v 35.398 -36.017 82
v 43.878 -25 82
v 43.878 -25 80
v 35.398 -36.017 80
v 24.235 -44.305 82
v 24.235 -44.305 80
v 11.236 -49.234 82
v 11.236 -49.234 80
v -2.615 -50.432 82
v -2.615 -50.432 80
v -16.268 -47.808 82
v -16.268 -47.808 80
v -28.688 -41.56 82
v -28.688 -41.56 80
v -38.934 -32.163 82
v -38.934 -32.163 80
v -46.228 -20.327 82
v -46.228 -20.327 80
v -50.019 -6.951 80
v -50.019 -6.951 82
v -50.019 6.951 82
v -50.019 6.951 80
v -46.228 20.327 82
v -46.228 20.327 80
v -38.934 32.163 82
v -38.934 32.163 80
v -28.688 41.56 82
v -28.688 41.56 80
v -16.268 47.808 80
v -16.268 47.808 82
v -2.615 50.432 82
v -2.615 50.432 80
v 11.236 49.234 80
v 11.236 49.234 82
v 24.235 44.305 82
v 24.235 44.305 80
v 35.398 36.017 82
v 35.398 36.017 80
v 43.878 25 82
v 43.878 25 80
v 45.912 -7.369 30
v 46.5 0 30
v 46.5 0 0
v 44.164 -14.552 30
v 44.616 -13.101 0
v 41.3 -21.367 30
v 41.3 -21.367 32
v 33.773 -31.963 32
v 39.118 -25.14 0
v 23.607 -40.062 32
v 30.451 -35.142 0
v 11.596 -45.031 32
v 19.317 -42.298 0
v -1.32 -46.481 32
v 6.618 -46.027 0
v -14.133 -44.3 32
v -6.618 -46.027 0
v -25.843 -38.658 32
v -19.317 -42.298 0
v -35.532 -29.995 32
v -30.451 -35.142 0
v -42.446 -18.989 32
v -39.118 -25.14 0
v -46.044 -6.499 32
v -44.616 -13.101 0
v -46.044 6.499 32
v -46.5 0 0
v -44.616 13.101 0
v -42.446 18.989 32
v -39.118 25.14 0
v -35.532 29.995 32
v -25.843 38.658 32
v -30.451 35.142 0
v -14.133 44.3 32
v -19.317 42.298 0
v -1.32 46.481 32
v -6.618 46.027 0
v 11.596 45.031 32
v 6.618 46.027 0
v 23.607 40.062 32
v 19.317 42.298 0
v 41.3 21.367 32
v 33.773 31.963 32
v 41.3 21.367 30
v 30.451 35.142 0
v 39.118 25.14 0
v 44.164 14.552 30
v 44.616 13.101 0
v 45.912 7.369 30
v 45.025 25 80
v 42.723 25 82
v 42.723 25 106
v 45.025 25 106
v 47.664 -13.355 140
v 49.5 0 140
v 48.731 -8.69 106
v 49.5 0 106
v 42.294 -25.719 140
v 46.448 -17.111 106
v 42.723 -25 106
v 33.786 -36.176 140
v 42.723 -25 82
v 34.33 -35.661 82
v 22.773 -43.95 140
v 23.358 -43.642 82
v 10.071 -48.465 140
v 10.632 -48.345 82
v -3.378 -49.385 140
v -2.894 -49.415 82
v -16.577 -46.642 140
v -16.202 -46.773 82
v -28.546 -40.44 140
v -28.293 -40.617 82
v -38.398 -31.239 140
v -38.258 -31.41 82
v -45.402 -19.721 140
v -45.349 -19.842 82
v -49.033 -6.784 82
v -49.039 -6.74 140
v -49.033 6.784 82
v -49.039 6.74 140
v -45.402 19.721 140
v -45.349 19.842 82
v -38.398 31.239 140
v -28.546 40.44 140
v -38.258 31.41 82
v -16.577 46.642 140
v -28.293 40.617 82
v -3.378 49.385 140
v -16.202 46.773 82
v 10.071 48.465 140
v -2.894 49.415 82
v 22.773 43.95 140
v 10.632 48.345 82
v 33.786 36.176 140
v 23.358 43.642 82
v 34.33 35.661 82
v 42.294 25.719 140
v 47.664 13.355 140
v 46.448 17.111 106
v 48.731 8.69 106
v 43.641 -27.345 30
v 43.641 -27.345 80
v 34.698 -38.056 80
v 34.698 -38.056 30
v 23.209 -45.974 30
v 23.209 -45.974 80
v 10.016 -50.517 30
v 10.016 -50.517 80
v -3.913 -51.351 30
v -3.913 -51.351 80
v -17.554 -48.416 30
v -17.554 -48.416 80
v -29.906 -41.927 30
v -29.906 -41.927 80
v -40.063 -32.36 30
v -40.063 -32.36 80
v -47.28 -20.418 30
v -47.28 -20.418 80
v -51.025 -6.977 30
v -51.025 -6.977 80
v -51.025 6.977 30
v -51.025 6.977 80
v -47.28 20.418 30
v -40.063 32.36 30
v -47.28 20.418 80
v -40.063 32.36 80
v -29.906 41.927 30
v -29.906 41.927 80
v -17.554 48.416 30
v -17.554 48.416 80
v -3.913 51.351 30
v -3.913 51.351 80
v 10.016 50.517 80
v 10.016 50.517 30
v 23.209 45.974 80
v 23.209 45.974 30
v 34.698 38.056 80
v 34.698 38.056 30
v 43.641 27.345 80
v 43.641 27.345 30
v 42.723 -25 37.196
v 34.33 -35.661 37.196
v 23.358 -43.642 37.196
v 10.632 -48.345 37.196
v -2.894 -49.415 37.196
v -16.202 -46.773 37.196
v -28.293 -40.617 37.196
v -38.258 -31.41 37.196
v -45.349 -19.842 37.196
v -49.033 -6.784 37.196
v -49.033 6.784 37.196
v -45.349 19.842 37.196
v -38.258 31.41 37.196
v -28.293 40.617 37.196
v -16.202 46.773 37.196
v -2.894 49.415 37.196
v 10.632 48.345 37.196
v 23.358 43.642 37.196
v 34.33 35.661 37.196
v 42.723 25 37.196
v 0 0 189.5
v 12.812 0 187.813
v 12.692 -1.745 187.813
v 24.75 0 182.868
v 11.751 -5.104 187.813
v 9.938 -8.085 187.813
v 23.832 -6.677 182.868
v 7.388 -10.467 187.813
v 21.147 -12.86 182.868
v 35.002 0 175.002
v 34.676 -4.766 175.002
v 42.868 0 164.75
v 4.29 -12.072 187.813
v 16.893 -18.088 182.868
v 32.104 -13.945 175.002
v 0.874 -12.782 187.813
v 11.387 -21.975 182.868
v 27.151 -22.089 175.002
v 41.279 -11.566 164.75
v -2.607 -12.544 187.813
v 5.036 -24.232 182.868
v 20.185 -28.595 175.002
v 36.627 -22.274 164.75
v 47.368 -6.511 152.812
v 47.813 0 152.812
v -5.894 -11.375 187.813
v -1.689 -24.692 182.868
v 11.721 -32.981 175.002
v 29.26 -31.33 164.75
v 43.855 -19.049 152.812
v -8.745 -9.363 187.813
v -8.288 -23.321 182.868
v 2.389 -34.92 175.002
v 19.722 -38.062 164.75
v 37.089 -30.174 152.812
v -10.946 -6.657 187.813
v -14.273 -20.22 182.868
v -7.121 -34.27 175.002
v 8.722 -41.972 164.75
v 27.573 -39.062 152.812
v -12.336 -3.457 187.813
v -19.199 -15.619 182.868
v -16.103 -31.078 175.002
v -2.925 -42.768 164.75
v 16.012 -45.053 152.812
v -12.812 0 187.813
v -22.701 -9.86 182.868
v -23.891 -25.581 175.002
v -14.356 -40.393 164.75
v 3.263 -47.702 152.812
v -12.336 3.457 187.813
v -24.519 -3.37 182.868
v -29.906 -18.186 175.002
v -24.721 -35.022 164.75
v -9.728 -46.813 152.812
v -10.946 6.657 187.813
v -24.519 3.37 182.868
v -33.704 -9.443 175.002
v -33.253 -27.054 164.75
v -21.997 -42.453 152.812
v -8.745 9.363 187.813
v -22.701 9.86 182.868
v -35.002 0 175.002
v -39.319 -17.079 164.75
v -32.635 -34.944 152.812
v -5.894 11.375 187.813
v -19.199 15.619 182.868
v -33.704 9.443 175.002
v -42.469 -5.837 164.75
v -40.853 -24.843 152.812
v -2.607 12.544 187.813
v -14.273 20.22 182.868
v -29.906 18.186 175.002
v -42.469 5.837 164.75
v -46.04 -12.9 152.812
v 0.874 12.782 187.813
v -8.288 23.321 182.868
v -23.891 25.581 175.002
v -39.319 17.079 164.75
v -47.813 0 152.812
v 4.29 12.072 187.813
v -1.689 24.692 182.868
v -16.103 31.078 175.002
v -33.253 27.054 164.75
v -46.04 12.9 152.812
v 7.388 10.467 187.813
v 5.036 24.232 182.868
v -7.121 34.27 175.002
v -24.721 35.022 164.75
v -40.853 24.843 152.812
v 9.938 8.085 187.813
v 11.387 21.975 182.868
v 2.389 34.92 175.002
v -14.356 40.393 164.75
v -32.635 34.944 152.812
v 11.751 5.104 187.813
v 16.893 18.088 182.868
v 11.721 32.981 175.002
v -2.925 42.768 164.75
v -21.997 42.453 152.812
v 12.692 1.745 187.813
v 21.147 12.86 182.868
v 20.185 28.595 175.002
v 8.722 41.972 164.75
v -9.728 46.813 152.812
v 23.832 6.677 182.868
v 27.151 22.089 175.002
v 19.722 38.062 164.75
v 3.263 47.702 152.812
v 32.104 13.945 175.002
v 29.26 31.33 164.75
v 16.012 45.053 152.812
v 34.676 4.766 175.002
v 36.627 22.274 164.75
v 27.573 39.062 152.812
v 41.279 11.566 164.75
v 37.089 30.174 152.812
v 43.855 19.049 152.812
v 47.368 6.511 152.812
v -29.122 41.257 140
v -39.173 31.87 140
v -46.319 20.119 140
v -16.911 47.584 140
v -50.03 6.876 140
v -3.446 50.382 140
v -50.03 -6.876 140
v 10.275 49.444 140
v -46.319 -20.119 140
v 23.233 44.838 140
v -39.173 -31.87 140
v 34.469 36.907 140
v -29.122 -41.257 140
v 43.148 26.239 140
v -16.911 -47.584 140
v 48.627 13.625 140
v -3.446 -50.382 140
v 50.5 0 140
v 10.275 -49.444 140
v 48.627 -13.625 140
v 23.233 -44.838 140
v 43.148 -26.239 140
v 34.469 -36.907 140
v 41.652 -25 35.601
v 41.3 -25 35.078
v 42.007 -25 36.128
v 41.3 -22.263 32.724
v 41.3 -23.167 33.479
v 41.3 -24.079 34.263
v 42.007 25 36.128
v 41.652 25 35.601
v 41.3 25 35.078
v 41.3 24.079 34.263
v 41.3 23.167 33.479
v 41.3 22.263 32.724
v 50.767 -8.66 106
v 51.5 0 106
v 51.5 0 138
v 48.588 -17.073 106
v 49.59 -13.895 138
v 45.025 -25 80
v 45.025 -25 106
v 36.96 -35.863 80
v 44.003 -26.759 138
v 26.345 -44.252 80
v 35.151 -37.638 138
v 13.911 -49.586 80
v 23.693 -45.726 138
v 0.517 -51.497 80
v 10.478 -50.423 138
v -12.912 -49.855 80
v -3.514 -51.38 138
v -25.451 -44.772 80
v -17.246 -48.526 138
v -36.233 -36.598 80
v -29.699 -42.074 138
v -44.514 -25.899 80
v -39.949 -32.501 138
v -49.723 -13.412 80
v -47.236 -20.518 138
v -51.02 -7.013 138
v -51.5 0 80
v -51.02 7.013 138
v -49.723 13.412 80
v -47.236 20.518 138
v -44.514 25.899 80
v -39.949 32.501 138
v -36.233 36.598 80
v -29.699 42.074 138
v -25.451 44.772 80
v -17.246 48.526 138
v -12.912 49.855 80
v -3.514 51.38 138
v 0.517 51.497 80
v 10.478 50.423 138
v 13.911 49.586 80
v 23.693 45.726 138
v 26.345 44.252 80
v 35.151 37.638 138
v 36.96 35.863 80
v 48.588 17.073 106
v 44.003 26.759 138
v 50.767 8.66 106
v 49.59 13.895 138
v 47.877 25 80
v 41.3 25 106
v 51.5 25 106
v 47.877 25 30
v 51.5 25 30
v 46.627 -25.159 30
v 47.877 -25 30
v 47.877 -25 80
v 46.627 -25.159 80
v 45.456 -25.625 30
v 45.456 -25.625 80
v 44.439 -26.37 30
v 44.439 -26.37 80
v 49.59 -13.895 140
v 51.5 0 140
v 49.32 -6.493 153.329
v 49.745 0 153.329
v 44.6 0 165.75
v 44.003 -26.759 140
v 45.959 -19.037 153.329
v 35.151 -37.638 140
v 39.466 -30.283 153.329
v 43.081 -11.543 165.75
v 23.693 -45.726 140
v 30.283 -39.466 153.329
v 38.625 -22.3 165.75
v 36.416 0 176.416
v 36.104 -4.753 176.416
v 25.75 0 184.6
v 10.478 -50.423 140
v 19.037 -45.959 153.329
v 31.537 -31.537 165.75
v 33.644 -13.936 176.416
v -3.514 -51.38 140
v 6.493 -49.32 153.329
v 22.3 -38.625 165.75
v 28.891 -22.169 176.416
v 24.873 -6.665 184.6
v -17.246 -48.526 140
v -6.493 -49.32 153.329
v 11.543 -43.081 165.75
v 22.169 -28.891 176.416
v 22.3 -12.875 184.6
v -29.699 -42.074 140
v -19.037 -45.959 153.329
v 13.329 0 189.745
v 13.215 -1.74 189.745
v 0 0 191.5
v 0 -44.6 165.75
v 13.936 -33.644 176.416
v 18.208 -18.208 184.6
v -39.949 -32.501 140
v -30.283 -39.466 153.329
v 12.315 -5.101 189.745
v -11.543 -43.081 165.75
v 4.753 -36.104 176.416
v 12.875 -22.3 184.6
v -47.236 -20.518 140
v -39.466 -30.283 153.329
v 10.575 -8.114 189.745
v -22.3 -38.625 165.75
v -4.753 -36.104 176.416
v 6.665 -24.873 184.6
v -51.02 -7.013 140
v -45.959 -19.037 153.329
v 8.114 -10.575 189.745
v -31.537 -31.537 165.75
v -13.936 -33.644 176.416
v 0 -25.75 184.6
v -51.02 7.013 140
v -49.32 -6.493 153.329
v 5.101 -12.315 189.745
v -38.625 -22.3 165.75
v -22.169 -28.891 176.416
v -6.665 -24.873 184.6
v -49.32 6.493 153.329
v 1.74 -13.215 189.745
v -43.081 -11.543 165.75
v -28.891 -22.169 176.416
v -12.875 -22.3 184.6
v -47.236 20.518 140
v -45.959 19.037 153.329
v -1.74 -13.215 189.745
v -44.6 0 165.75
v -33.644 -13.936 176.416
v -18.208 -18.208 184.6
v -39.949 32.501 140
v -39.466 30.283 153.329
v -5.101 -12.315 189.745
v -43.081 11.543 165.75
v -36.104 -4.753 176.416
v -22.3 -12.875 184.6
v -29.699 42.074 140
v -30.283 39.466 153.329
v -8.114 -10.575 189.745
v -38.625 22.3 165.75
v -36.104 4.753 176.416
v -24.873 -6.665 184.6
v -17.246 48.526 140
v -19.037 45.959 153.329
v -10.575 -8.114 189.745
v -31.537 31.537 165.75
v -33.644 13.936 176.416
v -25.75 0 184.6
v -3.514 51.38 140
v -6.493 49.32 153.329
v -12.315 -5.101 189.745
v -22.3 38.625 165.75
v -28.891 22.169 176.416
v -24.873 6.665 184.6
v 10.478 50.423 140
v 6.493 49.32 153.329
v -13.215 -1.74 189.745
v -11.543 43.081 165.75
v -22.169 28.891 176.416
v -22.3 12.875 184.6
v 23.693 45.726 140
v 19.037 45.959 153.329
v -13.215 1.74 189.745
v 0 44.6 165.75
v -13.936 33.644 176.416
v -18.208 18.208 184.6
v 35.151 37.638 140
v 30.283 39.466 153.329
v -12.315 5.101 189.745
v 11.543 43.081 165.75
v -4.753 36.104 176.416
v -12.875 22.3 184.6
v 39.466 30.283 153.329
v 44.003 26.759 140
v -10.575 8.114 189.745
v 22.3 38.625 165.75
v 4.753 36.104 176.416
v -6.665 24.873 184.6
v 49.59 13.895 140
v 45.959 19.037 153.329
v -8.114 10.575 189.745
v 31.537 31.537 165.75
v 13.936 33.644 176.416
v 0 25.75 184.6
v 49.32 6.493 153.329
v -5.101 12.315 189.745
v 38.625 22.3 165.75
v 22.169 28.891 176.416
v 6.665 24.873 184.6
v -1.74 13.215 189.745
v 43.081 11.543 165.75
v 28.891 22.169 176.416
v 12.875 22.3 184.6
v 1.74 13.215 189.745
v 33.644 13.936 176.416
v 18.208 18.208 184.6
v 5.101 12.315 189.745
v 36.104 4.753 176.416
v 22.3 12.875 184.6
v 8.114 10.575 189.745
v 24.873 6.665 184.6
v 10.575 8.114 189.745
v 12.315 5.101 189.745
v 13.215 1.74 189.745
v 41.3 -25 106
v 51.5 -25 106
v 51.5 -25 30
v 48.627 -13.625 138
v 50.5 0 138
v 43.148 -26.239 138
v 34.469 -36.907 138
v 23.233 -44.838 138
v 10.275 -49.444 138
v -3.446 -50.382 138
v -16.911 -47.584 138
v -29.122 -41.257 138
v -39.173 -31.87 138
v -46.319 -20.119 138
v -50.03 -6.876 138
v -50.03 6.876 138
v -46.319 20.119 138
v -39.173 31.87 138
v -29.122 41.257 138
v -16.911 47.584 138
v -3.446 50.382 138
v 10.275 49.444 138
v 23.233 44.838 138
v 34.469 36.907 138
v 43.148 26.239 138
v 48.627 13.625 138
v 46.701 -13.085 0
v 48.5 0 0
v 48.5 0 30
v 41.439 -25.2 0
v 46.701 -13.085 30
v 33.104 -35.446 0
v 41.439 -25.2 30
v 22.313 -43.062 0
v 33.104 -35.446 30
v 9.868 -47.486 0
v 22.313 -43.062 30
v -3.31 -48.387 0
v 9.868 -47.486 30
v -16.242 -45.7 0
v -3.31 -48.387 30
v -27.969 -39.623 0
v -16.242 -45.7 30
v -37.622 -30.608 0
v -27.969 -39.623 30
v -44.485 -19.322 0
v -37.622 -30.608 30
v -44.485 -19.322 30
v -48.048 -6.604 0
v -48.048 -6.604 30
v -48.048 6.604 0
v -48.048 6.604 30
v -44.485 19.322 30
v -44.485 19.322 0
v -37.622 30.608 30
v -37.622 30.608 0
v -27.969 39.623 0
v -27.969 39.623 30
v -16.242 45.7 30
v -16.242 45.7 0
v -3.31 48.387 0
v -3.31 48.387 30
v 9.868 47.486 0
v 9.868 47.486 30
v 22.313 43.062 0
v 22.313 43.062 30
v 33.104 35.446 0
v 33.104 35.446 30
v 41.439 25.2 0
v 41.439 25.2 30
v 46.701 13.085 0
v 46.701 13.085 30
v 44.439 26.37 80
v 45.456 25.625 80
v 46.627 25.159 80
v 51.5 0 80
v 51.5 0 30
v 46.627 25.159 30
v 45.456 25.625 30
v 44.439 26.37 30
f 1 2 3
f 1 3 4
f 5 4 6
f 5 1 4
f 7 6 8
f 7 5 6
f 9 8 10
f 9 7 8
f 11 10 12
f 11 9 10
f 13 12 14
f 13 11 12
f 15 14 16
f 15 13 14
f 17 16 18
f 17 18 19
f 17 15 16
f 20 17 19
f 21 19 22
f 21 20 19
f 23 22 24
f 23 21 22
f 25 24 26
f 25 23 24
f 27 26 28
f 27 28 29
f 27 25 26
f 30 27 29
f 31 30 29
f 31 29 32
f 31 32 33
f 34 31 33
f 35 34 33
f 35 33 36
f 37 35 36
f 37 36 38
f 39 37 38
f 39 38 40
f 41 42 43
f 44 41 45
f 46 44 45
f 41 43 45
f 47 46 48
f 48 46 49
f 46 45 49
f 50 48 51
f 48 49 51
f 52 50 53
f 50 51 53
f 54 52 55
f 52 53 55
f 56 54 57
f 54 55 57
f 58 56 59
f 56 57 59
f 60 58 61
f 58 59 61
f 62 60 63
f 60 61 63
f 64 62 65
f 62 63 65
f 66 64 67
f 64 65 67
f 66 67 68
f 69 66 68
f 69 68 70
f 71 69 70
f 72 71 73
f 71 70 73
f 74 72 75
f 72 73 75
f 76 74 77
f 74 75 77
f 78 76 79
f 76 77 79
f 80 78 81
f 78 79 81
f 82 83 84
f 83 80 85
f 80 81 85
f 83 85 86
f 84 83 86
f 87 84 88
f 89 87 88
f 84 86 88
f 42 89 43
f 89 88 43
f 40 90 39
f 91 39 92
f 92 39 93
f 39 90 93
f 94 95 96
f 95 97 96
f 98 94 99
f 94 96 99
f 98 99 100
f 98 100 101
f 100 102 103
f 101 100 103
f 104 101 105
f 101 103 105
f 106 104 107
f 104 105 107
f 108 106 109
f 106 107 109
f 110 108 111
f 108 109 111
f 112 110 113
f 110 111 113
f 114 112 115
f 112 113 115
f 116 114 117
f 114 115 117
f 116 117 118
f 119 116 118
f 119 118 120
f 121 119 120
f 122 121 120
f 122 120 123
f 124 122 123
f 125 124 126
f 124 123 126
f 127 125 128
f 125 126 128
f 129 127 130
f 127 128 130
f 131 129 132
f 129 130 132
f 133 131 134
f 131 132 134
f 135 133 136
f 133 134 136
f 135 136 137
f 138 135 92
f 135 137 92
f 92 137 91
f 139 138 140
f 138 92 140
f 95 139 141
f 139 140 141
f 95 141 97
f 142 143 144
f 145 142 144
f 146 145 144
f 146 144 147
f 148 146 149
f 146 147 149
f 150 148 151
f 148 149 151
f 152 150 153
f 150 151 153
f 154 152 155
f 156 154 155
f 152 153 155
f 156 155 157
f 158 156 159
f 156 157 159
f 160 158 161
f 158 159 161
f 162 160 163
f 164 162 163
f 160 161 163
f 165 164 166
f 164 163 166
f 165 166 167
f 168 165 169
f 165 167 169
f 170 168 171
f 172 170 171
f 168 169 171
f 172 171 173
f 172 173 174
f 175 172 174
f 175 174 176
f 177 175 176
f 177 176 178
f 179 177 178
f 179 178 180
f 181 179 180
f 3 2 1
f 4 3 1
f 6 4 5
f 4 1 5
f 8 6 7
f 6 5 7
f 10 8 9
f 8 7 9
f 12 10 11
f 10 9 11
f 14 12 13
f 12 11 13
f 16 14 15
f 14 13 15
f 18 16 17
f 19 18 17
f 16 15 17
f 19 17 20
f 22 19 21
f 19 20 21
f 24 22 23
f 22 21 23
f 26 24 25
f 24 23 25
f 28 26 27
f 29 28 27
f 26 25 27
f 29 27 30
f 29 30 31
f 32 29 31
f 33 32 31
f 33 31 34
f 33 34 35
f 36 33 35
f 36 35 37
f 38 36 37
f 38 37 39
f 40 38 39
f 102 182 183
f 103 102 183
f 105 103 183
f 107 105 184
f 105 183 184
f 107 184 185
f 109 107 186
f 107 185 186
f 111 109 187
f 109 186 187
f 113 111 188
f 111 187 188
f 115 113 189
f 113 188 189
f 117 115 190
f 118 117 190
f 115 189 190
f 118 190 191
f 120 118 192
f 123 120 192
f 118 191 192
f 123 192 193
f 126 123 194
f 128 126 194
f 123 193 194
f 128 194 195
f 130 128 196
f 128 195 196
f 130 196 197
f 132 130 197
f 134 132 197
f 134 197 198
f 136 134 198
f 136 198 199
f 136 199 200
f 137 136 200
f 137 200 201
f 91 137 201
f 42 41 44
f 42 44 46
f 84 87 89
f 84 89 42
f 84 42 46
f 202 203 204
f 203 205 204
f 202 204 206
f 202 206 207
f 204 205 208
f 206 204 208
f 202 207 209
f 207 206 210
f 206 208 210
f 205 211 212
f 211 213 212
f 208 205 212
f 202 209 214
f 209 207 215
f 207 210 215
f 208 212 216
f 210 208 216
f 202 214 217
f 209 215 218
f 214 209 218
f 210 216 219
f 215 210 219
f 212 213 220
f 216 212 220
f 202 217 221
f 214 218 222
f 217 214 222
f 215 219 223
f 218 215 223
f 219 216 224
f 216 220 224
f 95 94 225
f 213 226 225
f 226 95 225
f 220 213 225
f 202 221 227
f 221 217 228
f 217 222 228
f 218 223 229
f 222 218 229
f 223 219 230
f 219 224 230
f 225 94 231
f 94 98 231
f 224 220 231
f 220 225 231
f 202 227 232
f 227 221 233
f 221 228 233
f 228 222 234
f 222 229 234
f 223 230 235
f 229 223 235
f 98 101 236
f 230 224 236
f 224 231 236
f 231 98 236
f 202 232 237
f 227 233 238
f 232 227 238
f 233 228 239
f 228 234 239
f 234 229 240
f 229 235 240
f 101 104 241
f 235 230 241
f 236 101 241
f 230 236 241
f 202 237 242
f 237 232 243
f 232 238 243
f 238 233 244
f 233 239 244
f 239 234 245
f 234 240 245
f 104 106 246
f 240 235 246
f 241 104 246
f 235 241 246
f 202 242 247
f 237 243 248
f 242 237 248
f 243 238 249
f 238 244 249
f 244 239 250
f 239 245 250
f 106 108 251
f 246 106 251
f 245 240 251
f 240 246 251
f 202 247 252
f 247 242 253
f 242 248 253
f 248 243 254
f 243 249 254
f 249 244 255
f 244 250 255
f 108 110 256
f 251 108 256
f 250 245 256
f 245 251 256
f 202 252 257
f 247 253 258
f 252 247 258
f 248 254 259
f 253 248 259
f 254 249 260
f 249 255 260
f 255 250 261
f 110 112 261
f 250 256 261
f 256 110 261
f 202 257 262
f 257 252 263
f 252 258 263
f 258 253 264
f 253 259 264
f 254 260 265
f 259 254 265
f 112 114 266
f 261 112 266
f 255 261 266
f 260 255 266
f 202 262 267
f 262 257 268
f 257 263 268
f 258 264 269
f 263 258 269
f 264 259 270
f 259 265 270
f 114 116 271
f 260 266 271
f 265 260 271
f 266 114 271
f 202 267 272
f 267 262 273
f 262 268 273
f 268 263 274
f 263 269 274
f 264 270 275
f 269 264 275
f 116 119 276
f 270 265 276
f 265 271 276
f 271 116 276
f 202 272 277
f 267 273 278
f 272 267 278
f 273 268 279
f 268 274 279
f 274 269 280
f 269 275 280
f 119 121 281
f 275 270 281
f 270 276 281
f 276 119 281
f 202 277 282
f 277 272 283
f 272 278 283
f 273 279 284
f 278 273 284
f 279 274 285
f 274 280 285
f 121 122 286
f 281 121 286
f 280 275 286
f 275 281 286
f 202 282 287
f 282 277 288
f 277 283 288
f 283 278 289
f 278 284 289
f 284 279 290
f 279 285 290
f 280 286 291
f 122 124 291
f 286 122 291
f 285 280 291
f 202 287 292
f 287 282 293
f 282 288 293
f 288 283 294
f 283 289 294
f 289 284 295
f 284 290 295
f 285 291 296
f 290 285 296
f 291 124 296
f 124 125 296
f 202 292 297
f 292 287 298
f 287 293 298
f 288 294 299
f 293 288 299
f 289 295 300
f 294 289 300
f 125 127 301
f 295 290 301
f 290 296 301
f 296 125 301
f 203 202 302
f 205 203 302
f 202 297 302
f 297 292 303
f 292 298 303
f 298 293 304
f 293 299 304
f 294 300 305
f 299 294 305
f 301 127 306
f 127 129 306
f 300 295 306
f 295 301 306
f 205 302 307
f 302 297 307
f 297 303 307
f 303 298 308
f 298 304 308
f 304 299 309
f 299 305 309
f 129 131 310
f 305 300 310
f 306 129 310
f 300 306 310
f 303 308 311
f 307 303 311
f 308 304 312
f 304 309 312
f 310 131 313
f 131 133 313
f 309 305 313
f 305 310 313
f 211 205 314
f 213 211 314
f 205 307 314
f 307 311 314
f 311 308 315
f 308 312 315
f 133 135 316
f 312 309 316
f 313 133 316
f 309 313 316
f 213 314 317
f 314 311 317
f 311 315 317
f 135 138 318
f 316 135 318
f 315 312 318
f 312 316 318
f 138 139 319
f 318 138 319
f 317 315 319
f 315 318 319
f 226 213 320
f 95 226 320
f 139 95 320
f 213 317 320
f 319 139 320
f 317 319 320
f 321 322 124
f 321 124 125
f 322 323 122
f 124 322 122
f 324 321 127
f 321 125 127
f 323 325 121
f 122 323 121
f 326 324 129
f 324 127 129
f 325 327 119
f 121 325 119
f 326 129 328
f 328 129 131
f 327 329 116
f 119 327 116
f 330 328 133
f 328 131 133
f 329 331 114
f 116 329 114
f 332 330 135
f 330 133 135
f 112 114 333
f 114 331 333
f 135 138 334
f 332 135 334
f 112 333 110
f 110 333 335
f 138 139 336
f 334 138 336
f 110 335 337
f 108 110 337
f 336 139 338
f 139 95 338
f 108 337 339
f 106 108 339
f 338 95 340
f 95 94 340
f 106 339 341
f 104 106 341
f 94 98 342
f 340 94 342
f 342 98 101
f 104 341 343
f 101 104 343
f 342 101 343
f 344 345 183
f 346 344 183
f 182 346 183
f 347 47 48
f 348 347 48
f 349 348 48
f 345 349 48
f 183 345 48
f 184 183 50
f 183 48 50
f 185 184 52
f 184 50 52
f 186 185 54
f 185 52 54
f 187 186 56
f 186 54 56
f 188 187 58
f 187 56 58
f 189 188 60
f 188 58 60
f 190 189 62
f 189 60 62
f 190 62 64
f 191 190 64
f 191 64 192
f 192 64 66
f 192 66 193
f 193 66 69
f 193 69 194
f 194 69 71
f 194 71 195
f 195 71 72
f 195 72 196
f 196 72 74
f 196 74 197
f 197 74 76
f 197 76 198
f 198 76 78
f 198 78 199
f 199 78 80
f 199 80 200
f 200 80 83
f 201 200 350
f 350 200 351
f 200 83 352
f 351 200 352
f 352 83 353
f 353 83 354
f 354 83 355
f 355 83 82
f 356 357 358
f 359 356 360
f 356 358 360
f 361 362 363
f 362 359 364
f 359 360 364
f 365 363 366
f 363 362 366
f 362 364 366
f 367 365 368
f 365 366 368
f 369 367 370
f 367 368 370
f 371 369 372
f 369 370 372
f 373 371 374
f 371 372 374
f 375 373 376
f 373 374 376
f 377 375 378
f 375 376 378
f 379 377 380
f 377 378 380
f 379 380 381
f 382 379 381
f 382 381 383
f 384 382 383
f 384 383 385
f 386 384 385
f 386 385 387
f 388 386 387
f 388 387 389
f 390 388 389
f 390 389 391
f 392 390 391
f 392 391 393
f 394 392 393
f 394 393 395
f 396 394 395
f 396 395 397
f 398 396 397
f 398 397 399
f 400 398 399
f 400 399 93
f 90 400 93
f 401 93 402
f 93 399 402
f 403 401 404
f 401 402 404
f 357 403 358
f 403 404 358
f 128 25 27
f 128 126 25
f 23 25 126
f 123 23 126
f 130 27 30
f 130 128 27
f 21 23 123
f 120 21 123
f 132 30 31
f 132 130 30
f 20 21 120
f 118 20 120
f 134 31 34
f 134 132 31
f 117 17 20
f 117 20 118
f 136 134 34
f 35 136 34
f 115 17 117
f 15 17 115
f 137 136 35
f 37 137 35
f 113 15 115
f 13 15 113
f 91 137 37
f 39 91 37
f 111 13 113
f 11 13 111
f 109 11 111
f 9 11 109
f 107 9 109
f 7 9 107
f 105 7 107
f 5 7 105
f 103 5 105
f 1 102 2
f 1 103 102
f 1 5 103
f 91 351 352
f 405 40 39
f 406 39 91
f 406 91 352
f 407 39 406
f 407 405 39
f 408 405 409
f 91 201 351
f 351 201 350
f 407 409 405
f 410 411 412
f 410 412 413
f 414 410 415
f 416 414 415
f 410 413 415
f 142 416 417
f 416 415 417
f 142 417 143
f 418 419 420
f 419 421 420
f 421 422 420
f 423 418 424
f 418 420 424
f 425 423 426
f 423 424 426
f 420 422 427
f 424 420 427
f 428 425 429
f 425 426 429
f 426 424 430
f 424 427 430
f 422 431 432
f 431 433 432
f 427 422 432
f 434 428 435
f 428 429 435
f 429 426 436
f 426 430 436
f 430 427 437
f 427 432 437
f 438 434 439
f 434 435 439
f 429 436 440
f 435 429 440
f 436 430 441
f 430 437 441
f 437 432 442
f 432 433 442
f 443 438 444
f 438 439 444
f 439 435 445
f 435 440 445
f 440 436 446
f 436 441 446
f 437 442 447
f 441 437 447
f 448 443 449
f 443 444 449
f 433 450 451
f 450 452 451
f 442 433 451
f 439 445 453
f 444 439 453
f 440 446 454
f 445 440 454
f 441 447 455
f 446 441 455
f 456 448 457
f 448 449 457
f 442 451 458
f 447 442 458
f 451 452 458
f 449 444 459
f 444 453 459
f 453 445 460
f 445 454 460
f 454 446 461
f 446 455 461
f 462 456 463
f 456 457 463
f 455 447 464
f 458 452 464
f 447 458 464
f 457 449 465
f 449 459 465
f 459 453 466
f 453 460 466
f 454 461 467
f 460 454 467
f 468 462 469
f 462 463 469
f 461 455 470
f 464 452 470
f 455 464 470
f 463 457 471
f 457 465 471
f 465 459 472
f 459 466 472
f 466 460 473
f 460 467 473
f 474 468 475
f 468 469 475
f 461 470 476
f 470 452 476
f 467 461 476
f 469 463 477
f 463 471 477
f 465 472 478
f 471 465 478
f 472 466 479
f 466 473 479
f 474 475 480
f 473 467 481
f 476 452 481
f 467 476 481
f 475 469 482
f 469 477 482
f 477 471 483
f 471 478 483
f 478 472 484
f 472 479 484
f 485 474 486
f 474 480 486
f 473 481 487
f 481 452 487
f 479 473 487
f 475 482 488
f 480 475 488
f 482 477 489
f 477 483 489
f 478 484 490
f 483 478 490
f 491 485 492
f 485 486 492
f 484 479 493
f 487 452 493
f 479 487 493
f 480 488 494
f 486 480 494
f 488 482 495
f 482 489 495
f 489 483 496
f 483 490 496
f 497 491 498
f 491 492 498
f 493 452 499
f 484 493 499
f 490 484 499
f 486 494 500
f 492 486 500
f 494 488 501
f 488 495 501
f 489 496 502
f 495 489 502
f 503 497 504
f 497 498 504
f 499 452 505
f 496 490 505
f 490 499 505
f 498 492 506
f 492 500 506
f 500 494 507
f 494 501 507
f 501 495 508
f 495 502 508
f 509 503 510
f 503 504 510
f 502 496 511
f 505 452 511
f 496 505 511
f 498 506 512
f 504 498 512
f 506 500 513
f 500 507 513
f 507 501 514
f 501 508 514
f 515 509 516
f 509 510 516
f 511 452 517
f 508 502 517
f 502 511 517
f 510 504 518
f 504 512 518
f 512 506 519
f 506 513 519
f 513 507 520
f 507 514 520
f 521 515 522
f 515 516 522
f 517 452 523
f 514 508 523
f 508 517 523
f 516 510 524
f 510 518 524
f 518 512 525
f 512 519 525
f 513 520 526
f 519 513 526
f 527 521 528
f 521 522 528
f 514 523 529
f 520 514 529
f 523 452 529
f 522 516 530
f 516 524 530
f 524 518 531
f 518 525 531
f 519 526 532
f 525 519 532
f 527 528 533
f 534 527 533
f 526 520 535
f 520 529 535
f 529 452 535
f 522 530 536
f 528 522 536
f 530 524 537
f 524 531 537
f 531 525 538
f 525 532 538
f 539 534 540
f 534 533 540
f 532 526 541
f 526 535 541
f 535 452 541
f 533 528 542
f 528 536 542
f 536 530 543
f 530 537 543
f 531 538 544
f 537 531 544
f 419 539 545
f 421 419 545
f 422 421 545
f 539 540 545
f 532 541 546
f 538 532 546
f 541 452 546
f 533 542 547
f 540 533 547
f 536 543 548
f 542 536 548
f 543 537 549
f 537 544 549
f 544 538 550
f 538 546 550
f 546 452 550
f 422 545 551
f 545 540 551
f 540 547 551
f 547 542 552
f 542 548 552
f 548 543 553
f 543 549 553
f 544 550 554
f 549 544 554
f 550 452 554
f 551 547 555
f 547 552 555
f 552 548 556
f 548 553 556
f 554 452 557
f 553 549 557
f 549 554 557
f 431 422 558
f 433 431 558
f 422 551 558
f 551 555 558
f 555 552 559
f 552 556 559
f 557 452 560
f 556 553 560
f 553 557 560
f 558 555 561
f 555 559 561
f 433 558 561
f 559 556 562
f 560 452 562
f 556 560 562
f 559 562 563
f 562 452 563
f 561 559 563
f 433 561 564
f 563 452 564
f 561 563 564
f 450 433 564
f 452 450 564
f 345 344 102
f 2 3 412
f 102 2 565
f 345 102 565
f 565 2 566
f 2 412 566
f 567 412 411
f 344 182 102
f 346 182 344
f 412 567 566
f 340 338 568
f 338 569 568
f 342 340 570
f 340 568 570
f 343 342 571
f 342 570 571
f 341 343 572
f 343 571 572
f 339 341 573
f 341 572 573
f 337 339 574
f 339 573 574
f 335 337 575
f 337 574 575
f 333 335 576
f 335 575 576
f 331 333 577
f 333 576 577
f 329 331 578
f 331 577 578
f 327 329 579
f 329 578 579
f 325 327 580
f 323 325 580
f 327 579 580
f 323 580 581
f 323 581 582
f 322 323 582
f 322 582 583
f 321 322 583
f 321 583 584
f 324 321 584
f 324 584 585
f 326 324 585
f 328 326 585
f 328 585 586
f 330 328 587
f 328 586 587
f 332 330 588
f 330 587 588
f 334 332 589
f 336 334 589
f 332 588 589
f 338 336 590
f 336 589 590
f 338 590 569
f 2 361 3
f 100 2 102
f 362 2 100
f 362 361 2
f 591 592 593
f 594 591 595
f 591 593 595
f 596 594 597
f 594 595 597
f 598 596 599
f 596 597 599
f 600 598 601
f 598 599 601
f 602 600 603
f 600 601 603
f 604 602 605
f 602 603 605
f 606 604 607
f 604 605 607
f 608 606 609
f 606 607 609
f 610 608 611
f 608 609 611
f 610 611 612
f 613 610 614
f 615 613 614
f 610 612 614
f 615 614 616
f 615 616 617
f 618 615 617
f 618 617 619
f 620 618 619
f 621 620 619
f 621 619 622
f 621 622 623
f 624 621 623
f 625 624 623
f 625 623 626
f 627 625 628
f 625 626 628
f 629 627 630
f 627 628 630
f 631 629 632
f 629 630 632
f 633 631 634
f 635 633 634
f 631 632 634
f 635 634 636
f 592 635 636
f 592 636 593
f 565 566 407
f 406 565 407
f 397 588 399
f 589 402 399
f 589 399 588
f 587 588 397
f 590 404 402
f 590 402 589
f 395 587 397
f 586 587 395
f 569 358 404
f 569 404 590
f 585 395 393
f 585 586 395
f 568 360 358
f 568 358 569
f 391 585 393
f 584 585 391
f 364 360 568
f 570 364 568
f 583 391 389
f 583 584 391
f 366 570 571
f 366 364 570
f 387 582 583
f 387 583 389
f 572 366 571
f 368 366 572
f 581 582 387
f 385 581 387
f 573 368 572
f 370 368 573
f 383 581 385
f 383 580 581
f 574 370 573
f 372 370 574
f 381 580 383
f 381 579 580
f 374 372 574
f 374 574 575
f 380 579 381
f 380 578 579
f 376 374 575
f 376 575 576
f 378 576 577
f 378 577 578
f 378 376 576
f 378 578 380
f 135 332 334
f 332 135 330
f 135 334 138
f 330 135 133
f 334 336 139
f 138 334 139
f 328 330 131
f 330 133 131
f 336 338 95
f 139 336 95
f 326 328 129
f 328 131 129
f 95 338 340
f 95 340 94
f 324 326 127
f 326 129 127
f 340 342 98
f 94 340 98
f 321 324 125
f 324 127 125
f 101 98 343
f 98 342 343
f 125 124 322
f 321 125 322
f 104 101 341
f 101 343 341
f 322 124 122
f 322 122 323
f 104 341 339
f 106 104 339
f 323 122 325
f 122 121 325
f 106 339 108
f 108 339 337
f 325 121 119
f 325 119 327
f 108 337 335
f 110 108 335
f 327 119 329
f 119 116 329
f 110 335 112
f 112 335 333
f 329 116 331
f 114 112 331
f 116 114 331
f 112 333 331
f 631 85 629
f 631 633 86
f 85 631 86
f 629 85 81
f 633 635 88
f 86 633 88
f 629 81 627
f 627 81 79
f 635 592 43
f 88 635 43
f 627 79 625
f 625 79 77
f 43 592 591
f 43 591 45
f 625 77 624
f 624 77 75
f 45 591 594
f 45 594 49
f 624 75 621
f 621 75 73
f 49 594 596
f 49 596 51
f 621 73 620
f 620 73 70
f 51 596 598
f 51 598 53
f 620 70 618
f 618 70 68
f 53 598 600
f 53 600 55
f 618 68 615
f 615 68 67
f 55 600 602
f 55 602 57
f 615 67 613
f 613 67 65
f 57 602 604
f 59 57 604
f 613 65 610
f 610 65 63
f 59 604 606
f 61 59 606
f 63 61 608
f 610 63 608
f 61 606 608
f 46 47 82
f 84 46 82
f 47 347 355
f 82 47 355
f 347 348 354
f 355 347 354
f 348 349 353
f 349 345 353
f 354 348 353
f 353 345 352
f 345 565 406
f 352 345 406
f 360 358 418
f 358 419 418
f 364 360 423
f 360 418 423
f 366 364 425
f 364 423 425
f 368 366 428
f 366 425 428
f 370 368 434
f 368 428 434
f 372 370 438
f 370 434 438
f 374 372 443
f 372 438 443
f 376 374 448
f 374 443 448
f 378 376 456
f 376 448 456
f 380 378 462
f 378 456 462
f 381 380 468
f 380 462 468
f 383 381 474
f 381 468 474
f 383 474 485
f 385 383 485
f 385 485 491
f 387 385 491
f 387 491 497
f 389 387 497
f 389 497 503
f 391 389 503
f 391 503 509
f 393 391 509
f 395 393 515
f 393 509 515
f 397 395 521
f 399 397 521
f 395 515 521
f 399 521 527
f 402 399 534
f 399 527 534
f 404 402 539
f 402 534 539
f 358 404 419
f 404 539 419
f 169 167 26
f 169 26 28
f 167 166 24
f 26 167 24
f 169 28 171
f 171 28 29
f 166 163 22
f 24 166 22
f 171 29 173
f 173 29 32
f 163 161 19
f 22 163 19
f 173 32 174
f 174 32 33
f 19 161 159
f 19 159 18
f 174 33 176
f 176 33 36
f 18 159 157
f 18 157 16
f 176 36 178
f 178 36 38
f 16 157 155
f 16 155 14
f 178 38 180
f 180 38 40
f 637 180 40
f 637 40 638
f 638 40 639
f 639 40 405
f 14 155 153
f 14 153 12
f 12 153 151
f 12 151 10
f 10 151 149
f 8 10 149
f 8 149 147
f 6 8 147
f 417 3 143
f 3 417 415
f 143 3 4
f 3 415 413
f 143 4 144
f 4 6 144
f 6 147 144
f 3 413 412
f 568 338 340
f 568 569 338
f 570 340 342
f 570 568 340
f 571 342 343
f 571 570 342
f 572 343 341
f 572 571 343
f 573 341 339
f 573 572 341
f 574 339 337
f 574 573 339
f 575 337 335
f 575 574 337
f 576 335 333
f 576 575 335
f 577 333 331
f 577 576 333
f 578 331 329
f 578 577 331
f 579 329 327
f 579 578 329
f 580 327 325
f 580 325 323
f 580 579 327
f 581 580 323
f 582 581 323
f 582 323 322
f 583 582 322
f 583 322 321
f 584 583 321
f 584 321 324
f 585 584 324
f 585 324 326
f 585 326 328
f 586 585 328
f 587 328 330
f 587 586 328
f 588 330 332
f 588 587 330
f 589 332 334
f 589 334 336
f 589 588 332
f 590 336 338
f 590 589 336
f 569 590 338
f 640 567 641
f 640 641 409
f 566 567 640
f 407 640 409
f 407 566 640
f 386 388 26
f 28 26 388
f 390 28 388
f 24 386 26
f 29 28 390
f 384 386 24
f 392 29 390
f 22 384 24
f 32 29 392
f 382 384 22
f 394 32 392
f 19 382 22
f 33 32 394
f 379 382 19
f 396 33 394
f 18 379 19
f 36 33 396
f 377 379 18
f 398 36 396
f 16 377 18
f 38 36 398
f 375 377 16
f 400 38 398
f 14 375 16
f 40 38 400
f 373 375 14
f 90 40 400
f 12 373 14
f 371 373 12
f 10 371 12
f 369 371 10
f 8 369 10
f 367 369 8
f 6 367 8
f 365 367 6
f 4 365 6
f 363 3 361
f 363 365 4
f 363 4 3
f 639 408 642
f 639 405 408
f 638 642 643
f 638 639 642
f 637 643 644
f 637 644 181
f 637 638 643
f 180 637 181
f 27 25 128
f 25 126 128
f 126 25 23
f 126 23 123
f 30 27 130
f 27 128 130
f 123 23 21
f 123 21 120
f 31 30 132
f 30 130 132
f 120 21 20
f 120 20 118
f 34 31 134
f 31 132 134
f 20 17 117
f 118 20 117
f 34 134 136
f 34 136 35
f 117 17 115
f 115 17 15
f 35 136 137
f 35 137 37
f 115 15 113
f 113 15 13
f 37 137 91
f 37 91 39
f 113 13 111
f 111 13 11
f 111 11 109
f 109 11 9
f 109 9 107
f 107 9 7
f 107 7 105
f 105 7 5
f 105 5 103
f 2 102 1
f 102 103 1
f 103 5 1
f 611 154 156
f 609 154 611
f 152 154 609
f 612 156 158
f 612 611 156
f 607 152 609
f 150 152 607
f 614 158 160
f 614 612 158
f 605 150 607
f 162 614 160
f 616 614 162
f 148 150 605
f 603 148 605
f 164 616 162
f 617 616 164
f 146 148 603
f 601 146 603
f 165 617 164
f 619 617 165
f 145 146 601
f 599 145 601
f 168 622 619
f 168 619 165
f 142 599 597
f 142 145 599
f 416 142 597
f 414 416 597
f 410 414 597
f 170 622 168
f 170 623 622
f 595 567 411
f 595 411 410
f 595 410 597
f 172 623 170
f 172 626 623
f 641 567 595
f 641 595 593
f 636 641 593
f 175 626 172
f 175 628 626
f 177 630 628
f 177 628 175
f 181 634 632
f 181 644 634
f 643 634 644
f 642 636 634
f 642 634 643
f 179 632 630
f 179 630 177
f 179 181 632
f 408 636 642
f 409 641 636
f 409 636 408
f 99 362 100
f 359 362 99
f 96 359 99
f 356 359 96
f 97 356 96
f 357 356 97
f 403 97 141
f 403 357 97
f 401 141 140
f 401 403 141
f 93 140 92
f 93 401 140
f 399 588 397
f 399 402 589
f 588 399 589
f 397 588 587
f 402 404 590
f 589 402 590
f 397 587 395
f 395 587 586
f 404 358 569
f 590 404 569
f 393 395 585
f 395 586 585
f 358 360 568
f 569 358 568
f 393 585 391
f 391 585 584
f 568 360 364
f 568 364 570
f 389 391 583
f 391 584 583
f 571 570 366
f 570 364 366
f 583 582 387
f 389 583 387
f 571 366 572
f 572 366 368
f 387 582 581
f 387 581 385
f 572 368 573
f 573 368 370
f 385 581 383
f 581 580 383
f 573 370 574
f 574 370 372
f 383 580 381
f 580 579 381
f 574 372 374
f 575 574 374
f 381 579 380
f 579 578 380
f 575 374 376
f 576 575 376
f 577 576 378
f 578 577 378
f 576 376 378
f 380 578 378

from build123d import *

# Parameters (mm, degrees)
F3_W     = 50
F3_H     = 76
F4_DEPTH = 10.2
F11_R    = 5


with BuildPart() as f1:
    # F0 (on Front) → F1 (revolve)
    with BuildSketch(Plane.XZ):
        Polygon((46.5, 32), (46.5, 0), (48.5, 0), (48.5, 30), (51.5, 30), (51.5, 80), (50.5, 80), (50.5, 82), (49.5, 82), (49.5, 37.1961524227), align=None)
    revolve(axis=Axis((0, 0, 67.2105439007), (0, 0, -1)))

    # F3 (on plane+point) → F4 (join)
    with BuildSketch(Plane.YZ.offset(51.5)):
        with Locations((0, 68)):
            Rectangle(F3_W, F3_H)
    extrude(amount=-F4_DEPTH)


with BuildPart() as f6:
    # F5 (on Front) → F6 (revolve)
    with BuildSketch(Plane.XZ):
        Polygon((49.5, 140), (49.5, 82), (50.5, 82), (50.5, 80), (51.5, 80), (51.5, 140), align=None)
    revolve(axis=Axis((0, 0, 67.2105439007), (0, 0, -1)))


with BuildPart() as f8:
    # F7 (on Front) → F8 (revolve)
    with BuildSketch(Plane.XZ):
        with BuildLine():
            Line((50.5, 138), (51.5, 138))
            Line((51.5, 138), (51.5, 140))
            ThreePointArc((51.5, 140), (36.4159992311, 176.4159992311), (0, 191.5))
            Line((0, 191.5), (0, 189.5))
            ThreePointArc((0, 189.5), (35.0017856687, 175.0017856687), (49.5, 140))
            Line((49.5, 140), (50.5, 140))
            Line((50.5, 140), (50.5, 138))
        make_face()
    revolve(axis=Axis((0, 0, 67.2105439007), (0, 0, -1)))


with BuildPart() as f6_1:
    add(f6.part)

    # F9: cut F8
    add(f8.part, mode=Mode.SUBTRACT)

    # F10: cut F1
    add(f1.part, mode=Mode.SUBTRACT)


with BuildPart() as f1_1:
    add(f1.part)

    # F11
    f11_edges = [f1_1.edges().sort_by_distance(p)[0] for p in [
        (45.024993, -25, 55),
        (45.024993, 25, 55),
    ]]
    fillet(f11_edges, radius=F11_R)


solid = Compound([f8.part, f6_1.part, f1_1.part])
